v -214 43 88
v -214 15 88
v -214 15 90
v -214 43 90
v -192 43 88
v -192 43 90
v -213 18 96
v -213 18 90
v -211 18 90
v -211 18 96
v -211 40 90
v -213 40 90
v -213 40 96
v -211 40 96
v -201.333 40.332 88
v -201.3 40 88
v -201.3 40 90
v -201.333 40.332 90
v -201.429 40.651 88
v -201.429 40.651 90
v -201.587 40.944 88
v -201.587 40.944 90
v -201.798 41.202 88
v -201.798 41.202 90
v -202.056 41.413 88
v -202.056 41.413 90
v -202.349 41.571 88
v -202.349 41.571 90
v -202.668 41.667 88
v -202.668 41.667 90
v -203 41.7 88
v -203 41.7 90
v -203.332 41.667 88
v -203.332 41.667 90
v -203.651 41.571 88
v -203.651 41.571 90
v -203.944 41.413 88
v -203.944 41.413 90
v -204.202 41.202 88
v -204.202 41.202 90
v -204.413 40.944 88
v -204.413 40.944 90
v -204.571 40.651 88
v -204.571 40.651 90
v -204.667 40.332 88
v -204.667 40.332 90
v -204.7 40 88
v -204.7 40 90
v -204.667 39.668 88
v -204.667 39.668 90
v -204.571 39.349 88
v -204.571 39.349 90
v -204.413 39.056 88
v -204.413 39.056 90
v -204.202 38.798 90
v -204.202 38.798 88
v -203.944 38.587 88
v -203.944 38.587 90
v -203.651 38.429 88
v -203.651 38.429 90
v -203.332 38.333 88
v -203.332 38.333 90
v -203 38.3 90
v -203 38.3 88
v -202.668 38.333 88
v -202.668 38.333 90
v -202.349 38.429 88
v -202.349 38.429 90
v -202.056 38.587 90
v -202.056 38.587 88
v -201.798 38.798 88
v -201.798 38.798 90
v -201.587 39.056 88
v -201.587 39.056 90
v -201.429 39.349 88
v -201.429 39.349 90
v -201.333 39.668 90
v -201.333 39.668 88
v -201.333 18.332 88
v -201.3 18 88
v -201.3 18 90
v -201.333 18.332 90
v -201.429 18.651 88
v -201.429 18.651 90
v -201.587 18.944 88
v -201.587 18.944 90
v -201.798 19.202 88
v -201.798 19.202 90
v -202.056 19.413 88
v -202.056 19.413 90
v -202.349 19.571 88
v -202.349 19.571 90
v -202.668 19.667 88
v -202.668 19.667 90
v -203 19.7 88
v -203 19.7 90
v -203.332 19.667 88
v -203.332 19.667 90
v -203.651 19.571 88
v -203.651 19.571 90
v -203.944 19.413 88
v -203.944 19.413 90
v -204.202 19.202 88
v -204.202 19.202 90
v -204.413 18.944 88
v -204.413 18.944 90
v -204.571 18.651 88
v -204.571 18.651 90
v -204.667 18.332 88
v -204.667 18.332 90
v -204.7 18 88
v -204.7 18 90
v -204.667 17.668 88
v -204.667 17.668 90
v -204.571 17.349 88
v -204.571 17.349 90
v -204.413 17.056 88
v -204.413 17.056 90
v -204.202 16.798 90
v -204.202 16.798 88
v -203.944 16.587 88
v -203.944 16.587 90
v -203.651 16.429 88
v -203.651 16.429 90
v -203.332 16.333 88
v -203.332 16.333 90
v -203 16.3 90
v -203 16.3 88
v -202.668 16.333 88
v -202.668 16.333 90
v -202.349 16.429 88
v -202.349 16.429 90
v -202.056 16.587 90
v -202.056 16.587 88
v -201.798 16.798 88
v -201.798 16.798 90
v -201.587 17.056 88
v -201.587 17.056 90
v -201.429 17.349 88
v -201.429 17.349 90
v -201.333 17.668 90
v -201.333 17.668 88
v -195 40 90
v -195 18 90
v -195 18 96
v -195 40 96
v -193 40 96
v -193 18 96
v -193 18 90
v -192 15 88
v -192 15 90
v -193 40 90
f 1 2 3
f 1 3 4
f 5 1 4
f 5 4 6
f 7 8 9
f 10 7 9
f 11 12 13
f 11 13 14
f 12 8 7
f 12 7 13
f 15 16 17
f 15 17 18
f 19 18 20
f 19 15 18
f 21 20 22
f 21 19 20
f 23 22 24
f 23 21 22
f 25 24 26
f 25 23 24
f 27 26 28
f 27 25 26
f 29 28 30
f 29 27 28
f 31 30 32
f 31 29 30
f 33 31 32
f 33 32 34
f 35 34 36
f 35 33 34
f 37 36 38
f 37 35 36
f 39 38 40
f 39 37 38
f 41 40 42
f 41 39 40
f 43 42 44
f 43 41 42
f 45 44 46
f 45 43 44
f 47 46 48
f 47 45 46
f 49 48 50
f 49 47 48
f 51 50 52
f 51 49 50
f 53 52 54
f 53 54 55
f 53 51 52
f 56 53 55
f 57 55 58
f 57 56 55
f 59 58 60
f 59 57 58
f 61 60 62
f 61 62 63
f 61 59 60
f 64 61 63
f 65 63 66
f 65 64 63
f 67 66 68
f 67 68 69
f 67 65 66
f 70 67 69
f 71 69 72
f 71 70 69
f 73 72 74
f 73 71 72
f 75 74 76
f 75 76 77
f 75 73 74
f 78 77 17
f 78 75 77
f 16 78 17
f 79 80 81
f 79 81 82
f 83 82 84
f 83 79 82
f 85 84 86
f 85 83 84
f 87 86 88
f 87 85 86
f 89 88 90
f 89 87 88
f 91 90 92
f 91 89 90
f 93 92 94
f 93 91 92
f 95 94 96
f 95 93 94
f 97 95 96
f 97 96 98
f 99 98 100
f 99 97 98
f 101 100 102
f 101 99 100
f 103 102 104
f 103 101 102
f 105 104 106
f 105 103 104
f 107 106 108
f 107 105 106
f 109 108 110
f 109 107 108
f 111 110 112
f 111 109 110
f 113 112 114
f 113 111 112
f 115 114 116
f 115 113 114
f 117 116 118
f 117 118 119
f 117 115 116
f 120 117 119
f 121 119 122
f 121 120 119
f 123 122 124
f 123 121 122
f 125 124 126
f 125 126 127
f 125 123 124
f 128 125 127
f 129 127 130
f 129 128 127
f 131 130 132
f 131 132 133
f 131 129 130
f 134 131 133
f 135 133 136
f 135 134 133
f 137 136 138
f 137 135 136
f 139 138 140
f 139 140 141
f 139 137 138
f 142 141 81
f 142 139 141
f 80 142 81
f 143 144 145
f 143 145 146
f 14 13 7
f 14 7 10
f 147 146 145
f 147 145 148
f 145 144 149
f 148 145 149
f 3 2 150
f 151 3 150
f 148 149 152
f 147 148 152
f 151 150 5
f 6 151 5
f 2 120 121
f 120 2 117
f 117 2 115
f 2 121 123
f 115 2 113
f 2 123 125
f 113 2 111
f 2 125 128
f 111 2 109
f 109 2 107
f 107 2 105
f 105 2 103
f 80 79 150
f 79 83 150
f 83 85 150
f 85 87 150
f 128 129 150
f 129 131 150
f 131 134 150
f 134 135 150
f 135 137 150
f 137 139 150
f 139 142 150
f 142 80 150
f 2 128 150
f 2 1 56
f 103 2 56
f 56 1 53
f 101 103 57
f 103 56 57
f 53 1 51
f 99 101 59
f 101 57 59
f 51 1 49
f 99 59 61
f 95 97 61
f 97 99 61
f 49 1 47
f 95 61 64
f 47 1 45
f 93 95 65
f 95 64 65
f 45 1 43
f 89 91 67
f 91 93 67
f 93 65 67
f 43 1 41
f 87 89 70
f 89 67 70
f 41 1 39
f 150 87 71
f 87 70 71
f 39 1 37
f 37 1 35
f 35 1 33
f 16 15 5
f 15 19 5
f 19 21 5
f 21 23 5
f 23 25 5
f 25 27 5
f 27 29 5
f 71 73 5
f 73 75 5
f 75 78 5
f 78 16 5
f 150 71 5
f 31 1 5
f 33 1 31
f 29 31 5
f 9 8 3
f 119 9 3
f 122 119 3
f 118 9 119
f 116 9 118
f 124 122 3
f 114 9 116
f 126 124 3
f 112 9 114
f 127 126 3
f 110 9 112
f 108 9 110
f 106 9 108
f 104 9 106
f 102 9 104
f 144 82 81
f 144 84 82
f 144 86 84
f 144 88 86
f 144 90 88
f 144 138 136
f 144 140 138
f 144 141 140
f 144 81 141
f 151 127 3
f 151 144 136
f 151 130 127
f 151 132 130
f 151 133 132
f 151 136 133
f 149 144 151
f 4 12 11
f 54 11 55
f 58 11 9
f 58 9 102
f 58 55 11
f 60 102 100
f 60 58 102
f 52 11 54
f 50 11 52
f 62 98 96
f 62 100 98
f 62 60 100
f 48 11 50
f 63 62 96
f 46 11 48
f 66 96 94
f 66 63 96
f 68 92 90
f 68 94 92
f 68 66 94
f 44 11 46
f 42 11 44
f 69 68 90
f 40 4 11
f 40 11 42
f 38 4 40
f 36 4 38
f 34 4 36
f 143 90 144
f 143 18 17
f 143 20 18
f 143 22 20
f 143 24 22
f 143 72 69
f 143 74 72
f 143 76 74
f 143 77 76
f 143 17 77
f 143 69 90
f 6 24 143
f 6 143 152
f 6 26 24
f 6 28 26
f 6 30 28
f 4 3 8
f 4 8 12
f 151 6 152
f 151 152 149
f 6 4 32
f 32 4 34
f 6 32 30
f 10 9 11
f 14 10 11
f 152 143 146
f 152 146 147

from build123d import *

# Parameters (mm, degrees)
MAIN_PROFILE_SKETCH_W     = 22
MAIN_PROFILE_SKETCH_H     = 28
MAIN_PROFILE_SKETCH_R     = 1.7
MAIN_EXTRUSION_DEPTH      = 2
DETAIL_PROFILE_2_SKETCH_W = 2
DETAIL_PROFILE_2_SKETCH_H = 22
DETAIL_EXTRUSION_2_DEPTH  = 6


with BuildPart() as part:
    # Main Profile Sketch → Main Extrusion (new body)
    with BuildSketch(Plane.XY.offset(88)):
        with Locations((-203, 29)):
            Rectangle(MAIN_PROFILE_SKETCH_W, MAIN_PROFILE_SKETCH_H)
        with Locations((-203, 18)):
            Circle(MAIN_PROFILE_SKETCH_R, mode=Mode.SUBTRACT)
        with Locations((-203, 40)):
            Circle(MAIN_PROFILE_SKETCH_R, mode=Mode.SUBTRACT)
    extrude(amount=MAIN_EXTRUSION_DEPTH)

    # Detail Profile 2 Sketch → Detail Extrusion 2 (add)
    with BuildSketch(Plane.XY.offset(90)):
        with Locations((-194, 29)):
            Rectangle(DETAIL_PROFILE_2_SKETCH_W, DETAIL_PROFILE_2_SKETCH_H)
        with Locations((-212, 29)):
            Rectangle(DETAIL_PROFILE_2_SKETCH_W, DETAIL_PROFILE_2_SKETCH_H)
    extrude(amount=DETAIL_EXTRUSION_2_DEPTH)


solid = part.part
